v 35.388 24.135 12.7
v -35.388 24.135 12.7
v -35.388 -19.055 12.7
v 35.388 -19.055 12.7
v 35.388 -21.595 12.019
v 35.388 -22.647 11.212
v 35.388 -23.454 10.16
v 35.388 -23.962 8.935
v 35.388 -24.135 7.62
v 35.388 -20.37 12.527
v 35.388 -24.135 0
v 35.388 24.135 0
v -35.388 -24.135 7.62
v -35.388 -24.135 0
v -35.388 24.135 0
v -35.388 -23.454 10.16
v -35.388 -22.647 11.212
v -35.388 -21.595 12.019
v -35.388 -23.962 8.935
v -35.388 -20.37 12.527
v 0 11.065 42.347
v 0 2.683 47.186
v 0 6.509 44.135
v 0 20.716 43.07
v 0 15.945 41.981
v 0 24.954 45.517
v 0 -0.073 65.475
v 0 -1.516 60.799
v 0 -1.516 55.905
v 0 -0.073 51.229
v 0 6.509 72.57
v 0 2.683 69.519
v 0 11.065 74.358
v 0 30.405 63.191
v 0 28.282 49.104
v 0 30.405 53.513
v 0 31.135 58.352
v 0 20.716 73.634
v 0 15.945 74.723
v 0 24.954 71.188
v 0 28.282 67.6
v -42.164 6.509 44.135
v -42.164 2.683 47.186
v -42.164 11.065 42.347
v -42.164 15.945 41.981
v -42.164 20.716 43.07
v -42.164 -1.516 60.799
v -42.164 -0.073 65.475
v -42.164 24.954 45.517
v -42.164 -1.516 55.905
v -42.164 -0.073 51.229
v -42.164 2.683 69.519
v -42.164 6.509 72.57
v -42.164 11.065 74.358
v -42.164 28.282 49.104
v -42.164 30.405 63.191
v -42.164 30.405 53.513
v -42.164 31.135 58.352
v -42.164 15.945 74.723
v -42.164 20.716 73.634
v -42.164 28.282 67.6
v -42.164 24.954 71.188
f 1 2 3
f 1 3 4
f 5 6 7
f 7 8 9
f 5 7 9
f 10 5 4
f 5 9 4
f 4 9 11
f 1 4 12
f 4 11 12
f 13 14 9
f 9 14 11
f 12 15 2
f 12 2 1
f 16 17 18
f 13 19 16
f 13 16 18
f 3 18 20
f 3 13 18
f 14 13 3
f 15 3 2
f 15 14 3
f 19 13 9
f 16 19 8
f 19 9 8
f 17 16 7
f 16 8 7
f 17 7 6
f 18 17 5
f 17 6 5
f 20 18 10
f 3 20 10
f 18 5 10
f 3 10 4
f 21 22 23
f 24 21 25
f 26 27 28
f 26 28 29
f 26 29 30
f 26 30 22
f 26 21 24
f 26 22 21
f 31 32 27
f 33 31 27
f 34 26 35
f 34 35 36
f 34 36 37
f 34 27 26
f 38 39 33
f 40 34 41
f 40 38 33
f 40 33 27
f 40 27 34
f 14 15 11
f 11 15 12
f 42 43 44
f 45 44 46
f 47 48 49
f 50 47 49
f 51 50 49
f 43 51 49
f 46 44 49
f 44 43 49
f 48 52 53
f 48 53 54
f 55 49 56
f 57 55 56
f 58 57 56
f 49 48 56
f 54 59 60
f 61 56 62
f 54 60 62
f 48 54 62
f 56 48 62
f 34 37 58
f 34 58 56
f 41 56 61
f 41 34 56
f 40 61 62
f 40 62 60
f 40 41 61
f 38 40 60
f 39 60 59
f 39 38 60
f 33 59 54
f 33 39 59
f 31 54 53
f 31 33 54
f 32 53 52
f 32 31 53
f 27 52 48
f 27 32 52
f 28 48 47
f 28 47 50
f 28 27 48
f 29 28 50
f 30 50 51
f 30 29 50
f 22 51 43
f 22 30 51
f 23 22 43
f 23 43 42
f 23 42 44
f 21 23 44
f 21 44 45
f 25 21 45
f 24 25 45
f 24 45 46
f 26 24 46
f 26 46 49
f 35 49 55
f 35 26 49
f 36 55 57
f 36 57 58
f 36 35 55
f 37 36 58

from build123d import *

# Parameters (mm, degrees)
F0_W     = 70.776656
F0_H     = 48.269648
F1_DEPTH = 12.7
F2_R     = 5.08
F3_R     = 16.417002
F4_DEPTH = 42.164


with BuildPart() as f1:
    # F0 (on Top) → F1 (new body)
    with BuildSketch(Plane.XY):
        Rectangle(F0_W, F0_H)
    extrude(amount=F1_DEPTH)

    # F2
    f2_edges = [f1.edges().sort_by_distance(p)[0] for p in [
        (0, -24.134824, 12.7),
    ]]
    fillet(f2_edges, radius=F2_R)


with BuildPart() as f4:
    # F3 (on Right) → F4 (new body)
    with BuildSketch(Plane.YZ):
        with Locations((14.717753, 58.352273)):
            Circle(F3_R)
    extrude(amount=-F4_DEPTH)


solid = Compound([f1.part, f4.part])
